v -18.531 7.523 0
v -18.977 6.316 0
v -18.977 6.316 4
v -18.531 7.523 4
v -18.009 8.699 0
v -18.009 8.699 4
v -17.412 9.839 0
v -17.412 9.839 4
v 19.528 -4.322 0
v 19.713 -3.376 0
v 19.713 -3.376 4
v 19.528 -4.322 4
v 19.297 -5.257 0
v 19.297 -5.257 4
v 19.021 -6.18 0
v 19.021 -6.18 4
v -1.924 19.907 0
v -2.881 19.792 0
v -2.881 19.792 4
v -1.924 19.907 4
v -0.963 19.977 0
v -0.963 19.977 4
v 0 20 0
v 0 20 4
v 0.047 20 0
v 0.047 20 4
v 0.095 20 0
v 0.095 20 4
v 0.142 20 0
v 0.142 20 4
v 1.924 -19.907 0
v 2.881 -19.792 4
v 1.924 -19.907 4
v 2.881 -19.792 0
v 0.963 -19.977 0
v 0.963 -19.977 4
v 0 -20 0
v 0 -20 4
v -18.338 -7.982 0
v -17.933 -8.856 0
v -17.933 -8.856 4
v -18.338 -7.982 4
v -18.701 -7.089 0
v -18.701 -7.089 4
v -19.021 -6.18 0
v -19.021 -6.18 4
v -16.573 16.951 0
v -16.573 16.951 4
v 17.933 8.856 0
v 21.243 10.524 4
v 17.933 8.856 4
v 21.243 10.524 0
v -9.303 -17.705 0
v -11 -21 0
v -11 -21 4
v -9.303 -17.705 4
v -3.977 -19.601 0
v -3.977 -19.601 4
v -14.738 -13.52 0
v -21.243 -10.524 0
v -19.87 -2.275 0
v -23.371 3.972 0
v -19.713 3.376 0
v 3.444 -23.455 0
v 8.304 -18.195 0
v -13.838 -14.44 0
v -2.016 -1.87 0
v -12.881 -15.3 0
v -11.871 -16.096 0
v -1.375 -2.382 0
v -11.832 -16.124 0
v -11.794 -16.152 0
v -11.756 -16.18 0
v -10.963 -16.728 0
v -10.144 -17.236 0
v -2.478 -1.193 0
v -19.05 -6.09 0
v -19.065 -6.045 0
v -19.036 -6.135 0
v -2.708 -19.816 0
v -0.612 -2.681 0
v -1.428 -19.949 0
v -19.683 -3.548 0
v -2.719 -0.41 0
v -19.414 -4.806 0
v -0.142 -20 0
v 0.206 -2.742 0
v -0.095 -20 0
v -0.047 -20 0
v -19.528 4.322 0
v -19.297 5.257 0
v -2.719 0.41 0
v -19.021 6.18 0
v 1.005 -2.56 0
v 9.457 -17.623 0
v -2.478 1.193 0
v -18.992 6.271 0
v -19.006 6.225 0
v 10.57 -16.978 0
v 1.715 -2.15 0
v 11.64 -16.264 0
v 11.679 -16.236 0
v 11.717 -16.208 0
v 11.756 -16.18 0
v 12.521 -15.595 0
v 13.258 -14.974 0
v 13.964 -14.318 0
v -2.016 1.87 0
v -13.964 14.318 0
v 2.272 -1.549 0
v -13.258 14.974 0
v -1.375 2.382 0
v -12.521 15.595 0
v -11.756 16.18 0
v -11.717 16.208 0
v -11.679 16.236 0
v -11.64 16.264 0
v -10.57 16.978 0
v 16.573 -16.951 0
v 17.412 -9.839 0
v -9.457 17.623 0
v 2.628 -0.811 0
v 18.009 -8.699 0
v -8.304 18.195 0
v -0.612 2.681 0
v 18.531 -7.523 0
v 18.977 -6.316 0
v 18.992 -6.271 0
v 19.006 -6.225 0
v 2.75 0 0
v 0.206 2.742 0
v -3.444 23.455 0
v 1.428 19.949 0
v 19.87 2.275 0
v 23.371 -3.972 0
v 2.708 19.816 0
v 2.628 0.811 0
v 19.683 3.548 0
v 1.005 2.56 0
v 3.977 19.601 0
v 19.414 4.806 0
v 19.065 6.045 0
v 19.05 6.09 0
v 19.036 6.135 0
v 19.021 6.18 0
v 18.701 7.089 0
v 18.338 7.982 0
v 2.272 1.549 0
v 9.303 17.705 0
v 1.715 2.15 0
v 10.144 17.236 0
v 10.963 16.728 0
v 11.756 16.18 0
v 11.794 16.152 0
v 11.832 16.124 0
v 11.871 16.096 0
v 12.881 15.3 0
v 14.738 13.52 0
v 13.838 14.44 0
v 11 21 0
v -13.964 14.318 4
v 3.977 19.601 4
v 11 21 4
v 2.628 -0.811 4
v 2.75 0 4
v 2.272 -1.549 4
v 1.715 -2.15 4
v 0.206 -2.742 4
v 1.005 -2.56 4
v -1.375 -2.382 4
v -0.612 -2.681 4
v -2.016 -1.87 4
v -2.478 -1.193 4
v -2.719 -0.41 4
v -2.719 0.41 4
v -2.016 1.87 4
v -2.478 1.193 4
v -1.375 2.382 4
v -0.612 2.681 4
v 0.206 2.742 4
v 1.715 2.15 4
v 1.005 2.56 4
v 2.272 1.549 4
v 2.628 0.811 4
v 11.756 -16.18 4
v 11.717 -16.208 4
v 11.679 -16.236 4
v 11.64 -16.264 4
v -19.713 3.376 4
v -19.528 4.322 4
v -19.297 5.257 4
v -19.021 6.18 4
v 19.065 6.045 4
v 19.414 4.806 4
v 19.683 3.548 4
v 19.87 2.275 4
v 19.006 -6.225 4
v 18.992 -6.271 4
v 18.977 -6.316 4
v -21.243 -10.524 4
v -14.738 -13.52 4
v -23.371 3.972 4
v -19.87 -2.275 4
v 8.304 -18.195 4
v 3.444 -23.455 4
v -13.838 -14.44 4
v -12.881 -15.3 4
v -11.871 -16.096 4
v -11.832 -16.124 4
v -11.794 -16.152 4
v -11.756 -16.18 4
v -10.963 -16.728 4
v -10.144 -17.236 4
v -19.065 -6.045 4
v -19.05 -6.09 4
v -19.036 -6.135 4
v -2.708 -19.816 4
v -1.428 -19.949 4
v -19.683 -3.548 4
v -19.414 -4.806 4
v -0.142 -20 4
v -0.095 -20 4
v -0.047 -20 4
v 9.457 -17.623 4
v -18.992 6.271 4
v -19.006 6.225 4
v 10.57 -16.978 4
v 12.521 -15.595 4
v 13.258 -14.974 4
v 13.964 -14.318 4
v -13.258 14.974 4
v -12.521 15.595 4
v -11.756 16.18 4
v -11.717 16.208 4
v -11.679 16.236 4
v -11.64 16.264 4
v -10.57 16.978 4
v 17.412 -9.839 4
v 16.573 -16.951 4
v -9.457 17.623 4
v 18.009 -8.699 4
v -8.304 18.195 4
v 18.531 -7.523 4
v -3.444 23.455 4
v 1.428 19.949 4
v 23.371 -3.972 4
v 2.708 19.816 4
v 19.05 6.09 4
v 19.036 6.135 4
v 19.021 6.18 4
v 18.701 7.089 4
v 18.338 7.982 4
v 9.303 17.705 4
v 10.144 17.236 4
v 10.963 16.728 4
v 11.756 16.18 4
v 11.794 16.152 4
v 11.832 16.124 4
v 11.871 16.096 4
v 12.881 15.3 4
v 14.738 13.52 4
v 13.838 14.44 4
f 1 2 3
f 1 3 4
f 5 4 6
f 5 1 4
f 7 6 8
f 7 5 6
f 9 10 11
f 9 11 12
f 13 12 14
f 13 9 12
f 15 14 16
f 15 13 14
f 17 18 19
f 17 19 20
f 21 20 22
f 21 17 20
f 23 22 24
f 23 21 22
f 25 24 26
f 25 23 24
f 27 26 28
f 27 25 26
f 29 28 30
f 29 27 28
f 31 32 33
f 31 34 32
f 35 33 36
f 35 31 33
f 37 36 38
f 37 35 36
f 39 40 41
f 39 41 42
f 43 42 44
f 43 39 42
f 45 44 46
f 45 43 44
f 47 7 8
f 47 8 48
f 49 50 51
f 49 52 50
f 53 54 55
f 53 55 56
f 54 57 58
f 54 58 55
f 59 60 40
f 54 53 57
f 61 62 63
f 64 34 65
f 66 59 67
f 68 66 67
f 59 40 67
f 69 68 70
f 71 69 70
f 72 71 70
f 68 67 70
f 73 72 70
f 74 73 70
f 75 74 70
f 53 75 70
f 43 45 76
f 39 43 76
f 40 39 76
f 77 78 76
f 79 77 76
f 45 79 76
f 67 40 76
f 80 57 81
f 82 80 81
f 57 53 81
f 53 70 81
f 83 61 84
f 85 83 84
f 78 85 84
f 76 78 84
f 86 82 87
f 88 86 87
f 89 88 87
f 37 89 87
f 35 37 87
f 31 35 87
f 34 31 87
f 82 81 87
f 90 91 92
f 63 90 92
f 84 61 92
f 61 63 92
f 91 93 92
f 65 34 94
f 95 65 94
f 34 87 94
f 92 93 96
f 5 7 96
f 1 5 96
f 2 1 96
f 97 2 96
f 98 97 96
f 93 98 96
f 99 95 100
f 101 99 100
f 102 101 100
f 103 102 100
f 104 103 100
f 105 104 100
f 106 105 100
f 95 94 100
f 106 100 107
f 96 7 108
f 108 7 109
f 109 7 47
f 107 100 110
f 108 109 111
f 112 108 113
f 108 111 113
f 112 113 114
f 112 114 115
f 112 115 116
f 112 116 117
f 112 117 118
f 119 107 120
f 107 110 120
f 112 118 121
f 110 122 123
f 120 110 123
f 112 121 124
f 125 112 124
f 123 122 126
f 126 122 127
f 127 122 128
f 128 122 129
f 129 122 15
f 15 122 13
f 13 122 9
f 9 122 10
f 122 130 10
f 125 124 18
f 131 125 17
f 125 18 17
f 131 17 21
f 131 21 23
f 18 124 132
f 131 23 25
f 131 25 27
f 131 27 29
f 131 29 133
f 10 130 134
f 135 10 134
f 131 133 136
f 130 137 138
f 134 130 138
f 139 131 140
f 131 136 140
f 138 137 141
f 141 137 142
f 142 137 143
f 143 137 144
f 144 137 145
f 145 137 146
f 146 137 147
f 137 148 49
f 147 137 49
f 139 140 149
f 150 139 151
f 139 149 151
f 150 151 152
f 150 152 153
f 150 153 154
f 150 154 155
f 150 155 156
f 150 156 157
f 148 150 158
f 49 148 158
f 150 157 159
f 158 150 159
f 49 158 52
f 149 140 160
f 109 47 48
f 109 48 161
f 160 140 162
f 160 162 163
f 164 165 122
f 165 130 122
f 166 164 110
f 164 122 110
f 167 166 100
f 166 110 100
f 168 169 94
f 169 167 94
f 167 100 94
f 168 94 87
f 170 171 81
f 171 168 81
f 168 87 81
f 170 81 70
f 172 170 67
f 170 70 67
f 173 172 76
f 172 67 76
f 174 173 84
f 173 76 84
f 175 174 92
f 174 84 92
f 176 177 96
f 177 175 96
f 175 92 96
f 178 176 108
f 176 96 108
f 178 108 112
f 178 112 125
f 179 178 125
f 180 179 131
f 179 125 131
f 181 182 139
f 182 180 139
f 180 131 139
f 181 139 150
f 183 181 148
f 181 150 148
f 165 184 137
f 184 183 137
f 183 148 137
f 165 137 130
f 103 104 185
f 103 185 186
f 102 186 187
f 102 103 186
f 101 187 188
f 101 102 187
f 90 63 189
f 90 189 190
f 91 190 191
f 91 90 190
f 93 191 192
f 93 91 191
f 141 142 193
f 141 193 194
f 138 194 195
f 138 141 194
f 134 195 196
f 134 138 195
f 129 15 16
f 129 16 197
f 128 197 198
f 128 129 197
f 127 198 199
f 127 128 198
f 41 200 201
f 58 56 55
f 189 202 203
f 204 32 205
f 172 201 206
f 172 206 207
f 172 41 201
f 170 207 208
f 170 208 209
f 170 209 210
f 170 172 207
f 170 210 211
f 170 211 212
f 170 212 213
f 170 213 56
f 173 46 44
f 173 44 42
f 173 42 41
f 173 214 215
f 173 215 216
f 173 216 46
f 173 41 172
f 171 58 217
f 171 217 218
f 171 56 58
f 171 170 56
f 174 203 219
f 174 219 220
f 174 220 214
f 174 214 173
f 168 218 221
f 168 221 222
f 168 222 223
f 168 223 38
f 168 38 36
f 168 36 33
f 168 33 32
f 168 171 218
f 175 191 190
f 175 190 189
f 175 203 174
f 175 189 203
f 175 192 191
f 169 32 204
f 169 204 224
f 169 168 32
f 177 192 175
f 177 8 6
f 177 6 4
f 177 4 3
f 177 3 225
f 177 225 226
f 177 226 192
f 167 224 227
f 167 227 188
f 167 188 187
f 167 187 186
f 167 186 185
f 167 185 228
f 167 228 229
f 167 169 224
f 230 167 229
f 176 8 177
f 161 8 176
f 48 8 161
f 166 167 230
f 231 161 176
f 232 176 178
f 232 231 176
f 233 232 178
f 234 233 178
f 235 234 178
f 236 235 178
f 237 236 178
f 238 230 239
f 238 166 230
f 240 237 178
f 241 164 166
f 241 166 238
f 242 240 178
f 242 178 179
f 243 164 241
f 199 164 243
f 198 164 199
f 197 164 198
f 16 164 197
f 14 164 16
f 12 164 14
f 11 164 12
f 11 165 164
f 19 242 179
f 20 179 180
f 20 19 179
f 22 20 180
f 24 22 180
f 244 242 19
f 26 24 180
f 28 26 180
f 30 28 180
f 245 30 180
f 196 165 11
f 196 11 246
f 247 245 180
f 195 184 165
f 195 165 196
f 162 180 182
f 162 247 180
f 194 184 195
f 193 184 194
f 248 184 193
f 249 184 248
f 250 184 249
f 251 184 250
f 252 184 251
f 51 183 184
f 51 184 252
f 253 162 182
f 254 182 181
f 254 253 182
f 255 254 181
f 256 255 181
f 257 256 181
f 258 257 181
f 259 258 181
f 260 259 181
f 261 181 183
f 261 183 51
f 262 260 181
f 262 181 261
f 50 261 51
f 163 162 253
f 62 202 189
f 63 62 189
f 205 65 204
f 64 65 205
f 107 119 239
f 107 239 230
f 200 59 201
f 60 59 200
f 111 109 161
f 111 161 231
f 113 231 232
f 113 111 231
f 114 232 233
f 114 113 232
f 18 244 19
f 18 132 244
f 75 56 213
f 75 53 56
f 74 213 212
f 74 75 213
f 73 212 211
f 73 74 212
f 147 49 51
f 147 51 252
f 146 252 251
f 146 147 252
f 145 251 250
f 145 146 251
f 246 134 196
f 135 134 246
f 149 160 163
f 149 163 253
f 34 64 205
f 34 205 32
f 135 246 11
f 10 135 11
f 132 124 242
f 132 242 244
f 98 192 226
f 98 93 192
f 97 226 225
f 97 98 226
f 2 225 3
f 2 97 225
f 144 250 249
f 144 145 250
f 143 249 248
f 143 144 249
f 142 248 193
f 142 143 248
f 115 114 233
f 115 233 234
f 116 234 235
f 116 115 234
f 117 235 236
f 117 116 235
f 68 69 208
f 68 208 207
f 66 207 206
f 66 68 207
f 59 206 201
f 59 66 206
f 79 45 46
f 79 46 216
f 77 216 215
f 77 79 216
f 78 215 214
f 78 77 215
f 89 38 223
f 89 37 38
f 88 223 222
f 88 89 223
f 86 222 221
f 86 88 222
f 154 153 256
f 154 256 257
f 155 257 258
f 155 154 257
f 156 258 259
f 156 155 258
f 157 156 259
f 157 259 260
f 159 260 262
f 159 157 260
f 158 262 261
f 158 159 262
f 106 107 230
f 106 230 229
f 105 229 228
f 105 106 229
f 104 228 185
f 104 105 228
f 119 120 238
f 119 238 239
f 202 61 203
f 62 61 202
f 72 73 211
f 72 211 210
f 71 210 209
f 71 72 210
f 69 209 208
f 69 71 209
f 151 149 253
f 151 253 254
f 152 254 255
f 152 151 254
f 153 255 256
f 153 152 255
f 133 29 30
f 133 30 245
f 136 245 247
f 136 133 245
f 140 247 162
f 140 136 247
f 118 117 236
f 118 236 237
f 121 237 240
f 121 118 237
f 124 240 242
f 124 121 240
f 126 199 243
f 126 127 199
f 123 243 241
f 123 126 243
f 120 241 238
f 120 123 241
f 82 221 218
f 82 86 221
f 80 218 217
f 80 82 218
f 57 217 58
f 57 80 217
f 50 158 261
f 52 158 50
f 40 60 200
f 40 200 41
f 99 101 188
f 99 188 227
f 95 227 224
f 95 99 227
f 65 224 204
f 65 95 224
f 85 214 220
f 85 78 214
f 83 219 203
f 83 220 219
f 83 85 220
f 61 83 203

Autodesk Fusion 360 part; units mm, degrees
sketch "center" plane through (0, 0, 0) normal (0, 0, 1) x (1, 0, 0)
  line L0 (3.9767, 19.6007) -> (11, 21)
  line L1 (11, 21) -> (9.3026, 17.7049)
  arc A0 (3.9767, 19.6007) -> (0, 20) centre (0, 0) ccw
  arc A1 (11.8706, 16.0962) -> (9.3026, 17.7049) centre (0, 0) ccw
  arc A2 (-8.3037, 18.1947) -> (-11.7557, 16.1803) centre (0, 0) ccw
  line L2 (-8.3037, 18.1947) -> (-3.4443, 23.455)
  line L3 (-3.4443, 23.455) -> (-2.8807, 19.7915)
  arc A3 (0.1424, 19.9995) -> (-2.8807, 19.7915) centre (0, 0) ccw
  arc A4 (-17.4124, 9.839) -> (-19.0211, 6.1803) centre (0, 0) ccw
  line L4 (-17.4124, 9.839) -> (-16.573, 16.951)
  line L5 (-16.573, 16.951) -> (-13.9637, 14.3184)
  arc A5 (-11.6402, 16.2636) -> (-13.9637, 14.3184) centre (0, 0) ccw
  arc A6 (-19.8702, -2.2748) -> (-19.0211, -6.1803) centre (0, 0) ccw
  line L6 (-19.8702, -2.2748) -> (-23.3714, 3.9723)
  line L7 (-23.3714, 3.9723) -> (-19.713, 3.3762)
  arc A7 (-18.9766, 6.3156) -> (-19.713, 3.3762) centre (0, 0) ccw
  arc A8 (-14.7382, -13.5198) -> (-11.7557, -16.1803) centre (0, 0) ccw
  line L8 (-14.7382, -13.5198) -> (-21.2427, -10.5237)
  line L9 (-21.2427, -10.5237) -> (-17.9326, -8.8556)
  arc A9 (-19.0647, -6.0447) -> (-17.9326, -8.8556) centre (0, 0) ccw
  arc A10 (-3.9767, -19.6007) -> (0, -20) centre (0, 0) ccw
  line L10 (-3.9767, -19.6007) -> (-11, -21)
  line L11 (-11, -21) -> (-9.3026, -17.7049)
  arc A11 (-11.8706, -16.0962) -> (-9.3026, -17.7049) centre (0, 0) ccw
  arc A12 (8.3037, -18.1947) -> (11.7557, -16.1803) centre (0, 0) ccw
  line L12 (8.3037, -18.1947) -> (3.4443, -23.455)
  line L13 (3.4443, -23.455) -> (2.8807, -19.7915)
  arc A13 (-0.1424, -19.9995) -> (2.8807, -19.7915) centre (0, 0) ccw
  arc A14 (17.4124, -9.839) -> (19.0211, -6.1803) centre (0, 0) ccw
  line L14 (17.4124, -9.839) -> (16.573, -16.951)
  line L15 (16.573, -16.951) -> (13.9637, -14.3184)
  arc A15 (11.6402, -16.2636) -> (13.9637, -14.3184) centre (0, 0) ccw
  arc A16 (19.8702, 2.2748) -> (19.0211, 6.1803) centre (0, 0) ccw
  line L16 (19.8702, 2.2748) -> (23.3714, -3.9723)
  line L17 (23.3714, -3.9723) -> (19.713, -3.3762)
  arc A17 (18.9766, -6.3156) -> (19.713, -3.3762) centre (0, 0) ccw
  arc A18 (14.7382, 13.5198) -> (11.7557, 16.1803) centre (0, 0) ccw
  line L18 (14.7382, 13.5198) -> (21.2427, 10.5237)
  line L19 (21.2427, 10.5237) -> (17.9326, 8.8556)
  arc A19 (19.0647, 6.0447) -> (17.9326, 8.8556) centre (0, 0) ccw
  circle A20 centre (0, 0) radius 2.75
  dimension "d248" = 40
  dimension "d250" = 360
  dimension "d253" = 5.5
extrude "Extrude13" add sketch "center" along normal blind 4
equation "d = 4 mm"
equation "StockHeight = 3 mm"
equation "d250 = 360.0 °"
